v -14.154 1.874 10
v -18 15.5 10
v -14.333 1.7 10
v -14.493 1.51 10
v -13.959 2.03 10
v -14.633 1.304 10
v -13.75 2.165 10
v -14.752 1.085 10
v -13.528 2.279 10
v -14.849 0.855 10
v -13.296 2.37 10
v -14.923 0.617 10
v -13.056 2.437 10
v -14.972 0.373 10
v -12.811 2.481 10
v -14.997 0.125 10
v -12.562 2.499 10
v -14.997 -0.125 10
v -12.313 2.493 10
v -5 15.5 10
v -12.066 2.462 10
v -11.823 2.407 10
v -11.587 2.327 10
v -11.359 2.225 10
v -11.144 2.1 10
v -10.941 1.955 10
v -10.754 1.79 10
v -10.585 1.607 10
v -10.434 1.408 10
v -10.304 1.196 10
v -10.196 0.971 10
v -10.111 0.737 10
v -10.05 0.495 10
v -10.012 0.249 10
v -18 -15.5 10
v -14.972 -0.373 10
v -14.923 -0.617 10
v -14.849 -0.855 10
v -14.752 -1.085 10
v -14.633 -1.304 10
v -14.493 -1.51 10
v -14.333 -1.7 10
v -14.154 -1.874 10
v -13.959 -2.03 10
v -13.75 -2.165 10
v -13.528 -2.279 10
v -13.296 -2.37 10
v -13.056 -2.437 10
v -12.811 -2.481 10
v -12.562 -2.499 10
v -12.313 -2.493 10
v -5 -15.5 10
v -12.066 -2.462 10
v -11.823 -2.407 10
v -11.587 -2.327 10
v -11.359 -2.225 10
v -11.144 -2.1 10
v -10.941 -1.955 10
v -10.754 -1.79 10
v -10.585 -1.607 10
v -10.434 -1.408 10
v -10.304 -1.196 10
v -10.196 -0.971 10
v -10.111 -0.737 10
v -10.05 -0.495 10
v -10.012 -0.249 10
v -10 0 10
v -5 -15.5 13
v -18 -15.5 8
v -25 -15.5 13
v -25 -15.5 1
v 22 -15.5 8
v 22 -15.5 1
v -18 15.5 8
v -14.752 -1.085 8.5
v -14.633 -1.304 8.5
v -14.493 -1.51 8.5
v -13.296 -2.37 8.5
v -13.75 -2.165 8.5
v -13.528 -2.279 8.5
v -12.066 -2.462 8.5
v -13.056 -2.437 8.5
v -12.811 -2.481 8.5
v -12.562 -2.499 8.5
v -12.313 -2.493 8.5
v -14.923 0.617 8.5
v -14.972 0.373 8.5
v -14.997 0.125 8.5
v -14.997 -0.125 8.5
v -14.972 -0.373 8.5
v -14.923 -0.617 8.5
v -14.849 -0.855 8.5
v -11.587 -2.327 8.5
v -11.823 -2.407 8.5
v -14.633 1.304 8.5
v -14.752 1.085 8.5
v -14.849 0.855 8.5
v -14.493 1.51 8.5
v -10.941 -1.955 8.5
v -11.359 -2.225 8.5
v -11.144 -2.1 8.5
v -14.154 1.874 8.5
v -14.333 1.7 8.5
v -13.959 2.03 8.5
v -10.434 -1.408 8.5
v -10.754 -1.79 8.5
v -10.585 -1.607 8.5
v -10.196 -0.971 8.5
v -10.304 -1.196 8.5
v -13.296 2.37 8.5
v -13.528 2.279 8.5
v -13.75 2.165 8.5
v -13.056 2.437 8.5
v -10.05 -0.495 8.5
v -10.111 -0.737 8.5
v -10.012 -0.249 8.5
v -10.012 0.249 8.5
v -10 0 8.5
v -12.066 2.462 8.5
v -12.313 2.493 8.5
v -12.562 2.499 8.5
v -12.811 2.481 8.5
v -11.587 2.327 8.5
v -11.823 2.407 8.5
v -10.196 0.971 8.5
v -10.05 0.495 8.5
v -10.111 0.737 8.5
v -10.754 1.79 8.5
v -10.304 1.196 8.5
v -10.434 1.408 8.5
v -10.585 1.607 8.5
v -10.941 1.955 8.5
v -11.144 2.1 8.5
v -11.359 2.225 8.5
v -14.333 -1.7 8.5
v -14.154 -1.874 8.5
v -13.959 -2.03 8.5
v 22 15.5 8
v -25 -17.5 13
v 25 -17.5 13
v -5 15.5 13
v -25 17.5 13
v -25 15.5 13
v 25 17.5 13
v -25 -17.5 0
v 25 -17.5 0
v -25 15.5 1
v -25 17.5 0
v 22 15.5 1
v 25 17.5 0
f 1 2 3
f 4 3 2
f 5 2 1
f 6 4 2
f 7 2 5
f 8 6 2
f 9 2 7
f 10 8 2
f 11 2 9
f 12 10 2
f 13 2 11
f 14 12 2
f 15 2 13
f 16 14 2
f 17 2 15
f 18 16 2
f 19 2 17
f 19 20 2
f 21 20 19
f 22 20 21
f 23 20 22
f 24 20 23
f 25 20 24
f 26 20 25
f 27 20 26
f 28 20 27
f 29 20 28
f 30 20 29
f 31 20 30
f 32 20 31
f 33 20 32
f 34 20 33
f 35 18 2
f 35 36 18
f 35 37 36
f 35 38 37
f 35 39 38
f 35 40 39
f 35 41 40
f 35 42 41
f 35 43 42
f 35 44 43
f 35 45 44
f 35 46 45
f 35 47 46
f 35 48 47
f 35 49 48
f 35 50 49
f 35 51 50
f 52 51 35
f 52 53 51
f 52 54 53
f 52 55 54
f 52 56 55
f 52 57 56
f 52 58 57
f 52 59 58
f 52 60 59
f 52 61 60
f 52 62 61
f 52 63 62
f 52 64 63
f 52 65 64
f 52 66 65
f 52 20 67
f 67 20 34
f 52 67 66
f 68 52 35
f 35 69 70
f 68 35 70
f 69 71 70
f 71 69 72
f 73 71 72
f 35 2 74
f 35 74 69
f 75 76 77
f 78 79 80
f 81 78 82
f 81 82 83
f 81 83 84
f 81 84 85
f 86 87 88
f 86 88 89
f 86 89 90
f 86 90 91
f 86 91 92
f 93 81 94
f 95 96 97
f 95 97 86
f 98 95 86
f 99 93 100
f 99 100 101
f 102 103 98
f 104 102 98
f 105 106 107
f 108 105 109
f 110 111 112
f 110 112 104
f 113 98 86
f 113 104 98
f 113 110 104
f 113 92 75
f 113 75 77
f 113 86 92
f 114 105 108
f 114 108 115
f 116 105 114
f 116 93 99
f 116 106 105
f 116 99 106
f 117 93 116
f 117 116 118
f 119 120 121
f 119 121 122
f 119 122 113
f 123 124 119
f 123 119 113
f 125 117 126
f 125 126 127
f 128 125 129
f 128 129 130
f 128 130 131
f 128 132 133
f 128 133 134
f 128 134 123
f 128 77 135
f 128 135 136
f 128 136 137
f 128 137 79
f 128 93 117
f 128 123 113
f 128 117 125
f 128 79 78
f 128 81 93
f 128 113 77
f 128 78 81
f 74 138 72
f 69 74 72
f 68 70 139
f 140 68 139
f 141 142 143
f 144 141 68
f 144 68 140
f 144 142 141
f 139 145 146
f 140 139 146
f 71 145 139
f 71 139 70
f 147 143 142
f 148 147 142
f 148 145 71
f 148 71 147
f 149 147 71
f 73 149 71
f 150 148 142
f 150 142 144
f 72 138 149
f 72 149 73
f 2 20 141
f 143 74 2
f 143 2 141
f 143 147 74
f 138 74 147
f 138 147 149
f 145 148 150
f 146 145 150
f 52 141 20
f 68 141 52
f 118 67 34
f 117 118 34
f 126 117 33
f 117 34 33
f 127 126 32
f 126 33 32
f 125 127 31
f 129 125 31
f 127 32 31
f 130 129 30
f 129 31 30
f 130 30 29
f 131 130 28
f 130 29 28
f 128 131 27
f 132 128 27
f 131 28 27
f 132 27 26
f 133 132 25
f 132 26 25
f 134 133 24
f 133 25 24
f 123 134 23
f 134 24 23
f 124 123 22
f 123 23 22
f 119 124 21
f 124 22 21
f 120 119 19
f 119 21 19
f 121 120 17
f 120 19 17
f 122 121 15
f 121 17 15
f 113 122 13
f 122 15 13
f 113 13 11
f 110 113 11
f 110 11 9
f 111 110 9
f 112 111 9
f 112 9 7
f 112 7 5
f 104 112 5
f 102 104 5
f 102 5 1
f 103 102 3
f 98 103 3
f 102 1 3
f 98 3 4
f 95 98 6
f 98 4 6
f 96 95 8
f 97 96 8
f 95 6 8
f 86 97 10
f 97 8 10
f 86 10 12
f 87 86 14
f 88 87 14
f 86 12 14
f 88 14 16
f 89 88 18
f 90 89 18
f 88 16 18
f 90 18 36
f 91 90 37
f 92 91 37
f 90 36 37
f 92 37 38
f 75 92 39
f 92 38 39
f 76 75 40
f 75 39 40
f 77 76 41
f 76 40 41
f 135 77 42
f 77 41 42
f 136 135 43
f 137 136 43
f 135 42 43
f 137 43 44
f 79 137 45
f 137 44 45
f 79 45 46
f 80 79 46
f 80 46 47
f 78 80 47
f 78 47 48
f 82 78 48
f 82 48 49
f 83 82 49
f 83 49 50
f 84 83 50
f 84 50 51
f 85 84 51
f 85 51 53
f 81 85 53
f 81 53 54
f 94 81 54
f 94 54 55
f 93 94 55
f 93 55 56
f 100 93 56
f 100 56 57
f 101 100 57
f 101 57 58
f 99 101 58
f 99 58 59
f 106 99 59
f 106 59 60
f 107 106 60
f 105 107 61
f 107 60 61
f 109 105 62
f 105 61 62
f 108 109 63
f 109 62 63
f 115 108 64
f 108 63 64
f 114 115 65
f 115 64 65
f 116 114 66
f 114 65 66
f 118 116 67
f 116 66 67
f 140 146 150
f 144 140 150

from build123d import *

# Parameters (mm, degrees)
F0_W     = 50
F0_H     = 35
F1_DEPTH = 13
F2_W     = 31
F2_H     = 20
F3_DEPTH = 20
F4_W     = 31
F4_H     = 7
F5_DEPTH = 27
F6_W     = 31
F6_H     = 2
F7_DEPTH = 13
F8_R     = 2.5
F9_DEPTH = 1.5


with BuildPart() as f1:
    # F0 (on Top) → F1 (new body)
    with BuildSketch(Plane.XY):
        Rectangle(F0_W, F0_H)
    extrude(amount=F1_DEPTH)

    # F2 (on face) → F3 (cut)
    with BuildSketch(Plane(origin=(-25, 0, 0), x_dir=(0, -1, 0), z_dir=(-1, 0, 0))):
        with Locations((0, 11)):
            Rectangle(F2_W, F2_H)
    extrude(amount=-F3_DEPTH, mode=Mode.SUBTRACT)

    # F4 (on face) → F5 (cut)
    with BuildSketch(Plane(origin=(-5, 0, 0), x_dir=(0, -1, 0), z_dir=(-1, 0, 0))):
        with Locations((0, 4.5)):
            Rectangle(F4_W, F4_H)
    extrude(amount=-F5_DEPTH, mode=Mode.SUBTRACT)

    # F6 (on face) → F7 (join)
    with BuildSketch(Plane(origin=(-5, 0, 0), x_dir=(0, -1, 0), z_dir=(-1, 0, 0))):
        with Locations((0, 9)):
            Rectangle(F6_W, F6_H)
    extrude(amount=F7_DEPTH)

    # F8 (on face) → F9 (cut)
    with BuildSketch(Plane.XY.offset(10)):
        with Locations((-12.5, 0)):
            Circle(F8_R)
    extrude(amount=-F9_DEPTH, mode=Mode.SUBTRACT)


solid = f1.part
